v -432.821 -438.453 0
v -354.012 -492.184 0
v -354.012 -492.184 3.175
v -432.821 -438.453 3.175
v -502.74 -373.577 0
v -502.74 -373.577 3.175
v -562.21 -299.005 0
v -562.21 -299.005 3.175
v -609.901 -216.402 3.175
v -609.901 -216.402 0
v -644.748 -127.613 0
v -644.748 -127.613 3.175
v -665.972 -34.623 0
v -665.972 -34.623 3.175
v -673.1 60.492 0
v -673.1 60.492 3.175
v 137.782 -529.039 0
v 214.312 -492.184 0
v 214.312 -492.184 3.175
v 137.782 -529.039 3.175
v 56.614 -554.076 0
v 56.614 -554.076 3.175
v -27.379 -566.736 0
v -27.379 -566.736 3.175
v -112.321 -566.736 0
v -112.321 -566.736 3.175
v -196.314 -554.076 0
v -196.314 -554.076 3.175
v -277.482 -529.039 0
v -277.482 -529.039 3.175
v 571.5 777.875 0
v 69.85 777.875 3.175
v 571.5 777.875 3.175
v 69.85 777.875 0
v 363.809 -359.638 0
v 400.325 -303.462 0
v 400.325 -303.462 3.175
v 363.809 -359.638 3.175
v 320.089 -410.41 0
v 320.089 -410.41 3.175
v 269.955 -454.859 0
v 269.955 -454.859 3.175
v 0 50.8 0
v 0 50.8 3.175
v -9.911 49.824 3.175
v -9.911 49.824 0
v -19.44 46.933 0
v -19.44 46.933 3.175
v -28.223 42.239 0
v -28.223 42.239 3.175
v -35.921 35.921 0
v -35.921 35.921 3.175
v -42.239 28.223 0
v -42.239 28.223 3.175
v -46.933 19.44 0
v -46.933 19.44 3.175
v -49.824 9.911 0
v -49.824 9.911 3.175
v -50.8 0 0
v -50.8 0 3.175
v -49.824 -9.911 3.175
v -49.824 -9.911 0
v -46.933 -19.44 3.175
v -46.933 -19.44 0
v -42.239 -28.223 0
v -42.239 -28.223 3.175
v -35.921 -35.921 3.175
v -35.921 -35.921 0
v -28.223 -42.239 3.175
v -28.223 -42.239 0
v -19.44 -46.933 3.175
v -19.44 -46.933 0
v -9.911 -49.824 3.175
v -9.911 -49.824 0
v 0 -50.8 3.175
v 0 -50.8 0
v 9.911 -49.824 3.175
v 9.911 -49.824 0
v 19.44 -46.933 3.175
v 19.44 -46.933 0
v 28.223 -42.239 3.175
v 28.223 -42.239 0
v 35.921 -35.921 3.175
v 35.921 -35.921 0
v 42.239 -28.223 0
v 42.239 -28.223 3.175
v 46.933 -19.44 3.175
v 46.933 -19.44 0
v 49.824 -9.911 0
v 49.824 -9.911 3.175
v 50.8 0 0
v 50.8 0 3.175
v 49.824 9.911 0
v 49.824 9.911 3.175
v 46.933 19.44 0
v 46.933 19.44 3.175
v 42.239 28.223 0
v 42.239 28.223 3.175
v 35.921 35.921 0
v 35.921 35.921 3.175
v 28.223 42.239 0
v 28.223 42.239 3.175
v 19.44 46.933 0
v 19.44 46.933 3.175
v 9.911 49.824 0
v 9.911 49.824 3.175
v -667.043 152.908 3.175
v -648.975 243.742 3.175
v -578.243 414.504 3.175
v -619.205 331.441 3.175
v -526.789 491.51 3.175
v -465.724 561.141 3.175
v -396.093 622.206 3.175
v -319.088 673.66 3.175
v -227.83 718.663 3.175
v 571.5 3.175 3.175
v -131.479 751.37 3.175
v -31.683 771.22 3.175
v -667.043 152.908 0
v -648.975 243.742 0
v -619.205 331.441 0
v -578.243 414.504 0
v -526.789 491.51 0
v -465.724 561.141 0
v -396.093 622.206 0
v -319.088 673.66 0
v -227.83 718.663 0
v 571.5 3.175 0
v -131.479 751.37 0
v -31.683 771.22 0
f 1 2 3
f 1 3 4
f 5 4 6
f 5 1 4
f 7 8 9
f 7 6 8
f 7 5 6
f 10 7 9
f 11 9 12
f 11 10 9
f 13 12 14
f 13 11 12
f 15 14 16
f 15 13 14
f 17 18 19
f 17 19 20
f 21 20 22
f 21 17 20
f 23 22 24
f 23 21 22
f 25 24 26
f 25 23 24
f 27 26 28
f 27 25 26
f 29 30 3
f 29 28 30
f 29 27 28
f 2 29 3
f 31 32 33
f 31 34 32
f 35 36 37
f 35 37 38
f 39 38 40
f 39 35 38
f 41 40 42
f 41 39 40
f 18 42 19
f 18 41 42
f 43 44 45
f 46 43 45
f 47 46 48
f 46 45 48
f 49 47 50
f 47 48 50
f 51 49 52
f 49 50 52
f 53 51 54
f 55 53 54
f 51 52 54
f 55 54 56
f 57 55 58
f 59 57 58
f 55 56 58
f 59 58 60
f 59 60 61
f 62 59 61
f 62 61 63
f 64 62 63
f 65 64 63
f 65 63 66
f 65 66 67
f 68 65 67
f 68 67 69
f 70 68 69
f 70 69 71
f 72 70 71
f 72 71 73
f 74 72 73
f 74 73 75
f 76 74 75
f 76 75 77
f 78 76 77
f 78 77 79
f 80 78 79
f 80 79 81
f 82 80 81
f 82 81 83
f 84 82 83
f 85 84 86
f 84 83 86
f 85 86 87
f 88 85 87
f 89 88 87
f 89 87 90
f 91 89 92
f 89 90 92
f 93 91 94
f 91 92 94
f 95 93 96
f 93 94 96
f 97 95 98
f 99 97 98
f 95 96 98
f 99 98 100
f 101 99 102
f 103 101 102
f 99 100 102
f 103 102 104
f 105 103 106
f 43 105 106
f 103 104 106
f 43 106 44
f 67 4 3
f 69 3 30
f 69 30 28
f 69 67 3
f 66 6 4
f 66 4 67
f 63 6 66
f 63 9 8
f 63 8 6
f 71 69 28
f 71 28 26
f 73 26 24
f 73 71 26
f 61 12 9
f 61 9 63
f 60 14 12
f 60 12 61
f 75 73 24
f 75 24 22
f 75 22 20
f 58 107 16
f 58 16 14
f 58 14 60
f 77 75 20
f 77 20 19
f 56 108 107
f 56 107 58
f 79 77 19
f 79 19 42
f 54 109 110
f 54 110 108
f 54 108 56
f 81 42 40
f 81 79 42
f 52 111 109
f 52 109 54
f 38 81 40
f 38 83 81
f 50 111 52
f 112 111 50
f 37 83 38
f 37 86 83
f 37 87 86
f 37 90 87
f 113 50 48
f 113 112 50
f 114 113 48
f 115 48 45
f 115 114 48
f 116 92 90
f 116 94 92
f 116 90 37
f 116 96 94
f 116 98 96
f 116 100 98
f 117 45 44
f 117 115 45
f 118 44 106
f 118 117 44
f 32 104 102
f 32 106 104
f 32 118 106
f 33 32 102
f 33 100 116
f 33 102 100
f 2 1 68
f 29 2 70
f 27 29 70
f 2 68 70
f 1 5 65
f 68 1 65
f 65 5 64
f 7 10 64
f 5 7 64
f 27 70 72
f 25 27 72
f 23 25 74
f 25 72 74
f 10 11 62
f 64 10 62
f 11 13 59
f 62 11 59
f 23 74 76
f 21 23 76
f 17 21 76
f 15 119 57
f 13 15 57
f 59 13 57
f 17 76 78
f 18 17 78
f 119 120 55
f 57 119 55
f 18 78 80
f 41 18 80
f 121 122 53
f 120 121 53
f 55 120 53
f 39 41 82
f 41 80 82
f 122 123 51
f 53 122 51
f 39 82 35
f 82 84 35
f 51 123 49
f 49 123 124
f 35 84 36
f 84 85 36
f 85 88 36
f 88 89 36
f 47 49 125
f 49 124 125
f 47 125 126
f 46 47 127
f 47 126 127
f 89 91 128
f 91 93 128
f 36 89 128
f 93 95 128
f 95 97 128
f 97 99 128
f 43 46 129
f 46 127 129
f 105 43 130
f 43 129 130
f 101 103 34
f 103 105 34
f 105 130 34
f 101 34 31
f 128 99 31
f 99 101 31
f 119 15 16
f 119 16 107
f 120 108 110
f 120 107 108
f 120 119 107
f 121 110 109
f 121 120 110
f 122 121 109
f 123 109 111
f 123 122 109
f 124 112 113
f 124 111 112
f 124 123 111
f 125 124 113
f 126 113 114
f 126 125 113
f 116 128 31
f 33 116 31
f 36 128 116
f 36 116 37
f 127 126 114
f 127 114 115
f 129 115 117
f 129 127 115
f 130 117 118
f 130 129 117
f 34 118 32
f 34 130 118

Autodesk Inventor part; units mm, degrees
ref_plane "YZ Plane" through (0, 0, 0) normal (1, 0, 0) x (0, 1, 0)
ref_plane "XZ Plane" through (0, 0, 0) normal (0, 1, 0) x (-1, 0, 0)
ref_plane "XY Plane" through (0, 0, 0) normal (0, 0, 1) x (1, 0, 0)
sketch "Sketch1" plane through (0, 0, 0) normal (0, 0, 1) x (1, 0, 0)
  circle A0 centre (0, 0) radius 69.85 construction
  line L0 (69.85, 0) -> (34.925, -60.4919) construction
  line L1 (34.925, -60.4919) -> (-34.925, -60.4919) construction
  line L2 (-34.925, -60.4919) -> (-69.85, 0) construction
  line L3 (-69.85, 0) -> (-34.925, 60.4919) construction
  line L4 (-34.925, 60.4919) -> (34.925, 60.4919) construction
  line L5 (34.925, 60.4919) -> (69.85, 0) construction
  line L6 (69.85, 0) -> (69.85, 777.875) construction
  line L7 (0, 60.4919) -> (0, -60.4919) construction
  line L8 (-69.85, 0) -> (69.85, 0) construction
  arc A1 (69.85, 777.875) -> (-319.0875, 673.6595) centre (69.85, 0) ccw
  arc A2 (-319.0875, 673.6595) -> (-673.1, 60.4919) centre (34.925, 60.4919) ccw
  arc A3 (-673.1, 60.4919) -> (-354.0125, -492.1839) centre (-34.925, 60.4919) ccw
  arc A4 (-354.0125, -492.1839) -> (214.3125, -492.1839) centre (-69.85, 0) ccw
  arc A5 (214.3125, -492.1839) -> (463.55, -60.4919) centre (-34.925, -60.4919) ccw
  arc A6 (463.55, -60.4919) -> (458.7952, 3.175) centre (34.925, -60.4919) ccw
  line L9 (458.7952, 3.175) -> (571.5, 3.175)
  line L10 (571.5, 3.175) -> (571.5, 777.875)
  line L11 (69.85, 777.875) -> (571.5, 777.875)
  line L12 (571.5, 3.175) -> (400.325, -303.4625)
  dimension "d0" = 777.875
  dimension "d1" = 139.7
  dimension "d2" = 571.5
  dimension "d3" = 774.7
  dimension "d5" = 498.475
extrude "Extrusion1" add sketch "Sketch1" along normal blind 3.175
hole "Hole1" at (0, 0, 0) direction (0, 0, 1) diameter 101.6 end through all
ref_plane "Work Plane1" through (0, 0, 1833.3831) normal (-1, 0, 0) x (0, 0, 1)
ref_plane "Work Plane2" through (0, 0, 1833.3831) normal (0, -1, 0) x (0, 0, 1)
ref_plane "Work Plane3" through (0, 0, 1833.3831) normal (0.7071, -0.7071, 0) x (0, 0, 1)
ref_plane "Work Plane4" through (0, 0, 1833.3831) normal (-0.7071, -0.7071, 0) x (0, 0, 1)
properties part number "drive side sheet" material "Steel, Mild"
